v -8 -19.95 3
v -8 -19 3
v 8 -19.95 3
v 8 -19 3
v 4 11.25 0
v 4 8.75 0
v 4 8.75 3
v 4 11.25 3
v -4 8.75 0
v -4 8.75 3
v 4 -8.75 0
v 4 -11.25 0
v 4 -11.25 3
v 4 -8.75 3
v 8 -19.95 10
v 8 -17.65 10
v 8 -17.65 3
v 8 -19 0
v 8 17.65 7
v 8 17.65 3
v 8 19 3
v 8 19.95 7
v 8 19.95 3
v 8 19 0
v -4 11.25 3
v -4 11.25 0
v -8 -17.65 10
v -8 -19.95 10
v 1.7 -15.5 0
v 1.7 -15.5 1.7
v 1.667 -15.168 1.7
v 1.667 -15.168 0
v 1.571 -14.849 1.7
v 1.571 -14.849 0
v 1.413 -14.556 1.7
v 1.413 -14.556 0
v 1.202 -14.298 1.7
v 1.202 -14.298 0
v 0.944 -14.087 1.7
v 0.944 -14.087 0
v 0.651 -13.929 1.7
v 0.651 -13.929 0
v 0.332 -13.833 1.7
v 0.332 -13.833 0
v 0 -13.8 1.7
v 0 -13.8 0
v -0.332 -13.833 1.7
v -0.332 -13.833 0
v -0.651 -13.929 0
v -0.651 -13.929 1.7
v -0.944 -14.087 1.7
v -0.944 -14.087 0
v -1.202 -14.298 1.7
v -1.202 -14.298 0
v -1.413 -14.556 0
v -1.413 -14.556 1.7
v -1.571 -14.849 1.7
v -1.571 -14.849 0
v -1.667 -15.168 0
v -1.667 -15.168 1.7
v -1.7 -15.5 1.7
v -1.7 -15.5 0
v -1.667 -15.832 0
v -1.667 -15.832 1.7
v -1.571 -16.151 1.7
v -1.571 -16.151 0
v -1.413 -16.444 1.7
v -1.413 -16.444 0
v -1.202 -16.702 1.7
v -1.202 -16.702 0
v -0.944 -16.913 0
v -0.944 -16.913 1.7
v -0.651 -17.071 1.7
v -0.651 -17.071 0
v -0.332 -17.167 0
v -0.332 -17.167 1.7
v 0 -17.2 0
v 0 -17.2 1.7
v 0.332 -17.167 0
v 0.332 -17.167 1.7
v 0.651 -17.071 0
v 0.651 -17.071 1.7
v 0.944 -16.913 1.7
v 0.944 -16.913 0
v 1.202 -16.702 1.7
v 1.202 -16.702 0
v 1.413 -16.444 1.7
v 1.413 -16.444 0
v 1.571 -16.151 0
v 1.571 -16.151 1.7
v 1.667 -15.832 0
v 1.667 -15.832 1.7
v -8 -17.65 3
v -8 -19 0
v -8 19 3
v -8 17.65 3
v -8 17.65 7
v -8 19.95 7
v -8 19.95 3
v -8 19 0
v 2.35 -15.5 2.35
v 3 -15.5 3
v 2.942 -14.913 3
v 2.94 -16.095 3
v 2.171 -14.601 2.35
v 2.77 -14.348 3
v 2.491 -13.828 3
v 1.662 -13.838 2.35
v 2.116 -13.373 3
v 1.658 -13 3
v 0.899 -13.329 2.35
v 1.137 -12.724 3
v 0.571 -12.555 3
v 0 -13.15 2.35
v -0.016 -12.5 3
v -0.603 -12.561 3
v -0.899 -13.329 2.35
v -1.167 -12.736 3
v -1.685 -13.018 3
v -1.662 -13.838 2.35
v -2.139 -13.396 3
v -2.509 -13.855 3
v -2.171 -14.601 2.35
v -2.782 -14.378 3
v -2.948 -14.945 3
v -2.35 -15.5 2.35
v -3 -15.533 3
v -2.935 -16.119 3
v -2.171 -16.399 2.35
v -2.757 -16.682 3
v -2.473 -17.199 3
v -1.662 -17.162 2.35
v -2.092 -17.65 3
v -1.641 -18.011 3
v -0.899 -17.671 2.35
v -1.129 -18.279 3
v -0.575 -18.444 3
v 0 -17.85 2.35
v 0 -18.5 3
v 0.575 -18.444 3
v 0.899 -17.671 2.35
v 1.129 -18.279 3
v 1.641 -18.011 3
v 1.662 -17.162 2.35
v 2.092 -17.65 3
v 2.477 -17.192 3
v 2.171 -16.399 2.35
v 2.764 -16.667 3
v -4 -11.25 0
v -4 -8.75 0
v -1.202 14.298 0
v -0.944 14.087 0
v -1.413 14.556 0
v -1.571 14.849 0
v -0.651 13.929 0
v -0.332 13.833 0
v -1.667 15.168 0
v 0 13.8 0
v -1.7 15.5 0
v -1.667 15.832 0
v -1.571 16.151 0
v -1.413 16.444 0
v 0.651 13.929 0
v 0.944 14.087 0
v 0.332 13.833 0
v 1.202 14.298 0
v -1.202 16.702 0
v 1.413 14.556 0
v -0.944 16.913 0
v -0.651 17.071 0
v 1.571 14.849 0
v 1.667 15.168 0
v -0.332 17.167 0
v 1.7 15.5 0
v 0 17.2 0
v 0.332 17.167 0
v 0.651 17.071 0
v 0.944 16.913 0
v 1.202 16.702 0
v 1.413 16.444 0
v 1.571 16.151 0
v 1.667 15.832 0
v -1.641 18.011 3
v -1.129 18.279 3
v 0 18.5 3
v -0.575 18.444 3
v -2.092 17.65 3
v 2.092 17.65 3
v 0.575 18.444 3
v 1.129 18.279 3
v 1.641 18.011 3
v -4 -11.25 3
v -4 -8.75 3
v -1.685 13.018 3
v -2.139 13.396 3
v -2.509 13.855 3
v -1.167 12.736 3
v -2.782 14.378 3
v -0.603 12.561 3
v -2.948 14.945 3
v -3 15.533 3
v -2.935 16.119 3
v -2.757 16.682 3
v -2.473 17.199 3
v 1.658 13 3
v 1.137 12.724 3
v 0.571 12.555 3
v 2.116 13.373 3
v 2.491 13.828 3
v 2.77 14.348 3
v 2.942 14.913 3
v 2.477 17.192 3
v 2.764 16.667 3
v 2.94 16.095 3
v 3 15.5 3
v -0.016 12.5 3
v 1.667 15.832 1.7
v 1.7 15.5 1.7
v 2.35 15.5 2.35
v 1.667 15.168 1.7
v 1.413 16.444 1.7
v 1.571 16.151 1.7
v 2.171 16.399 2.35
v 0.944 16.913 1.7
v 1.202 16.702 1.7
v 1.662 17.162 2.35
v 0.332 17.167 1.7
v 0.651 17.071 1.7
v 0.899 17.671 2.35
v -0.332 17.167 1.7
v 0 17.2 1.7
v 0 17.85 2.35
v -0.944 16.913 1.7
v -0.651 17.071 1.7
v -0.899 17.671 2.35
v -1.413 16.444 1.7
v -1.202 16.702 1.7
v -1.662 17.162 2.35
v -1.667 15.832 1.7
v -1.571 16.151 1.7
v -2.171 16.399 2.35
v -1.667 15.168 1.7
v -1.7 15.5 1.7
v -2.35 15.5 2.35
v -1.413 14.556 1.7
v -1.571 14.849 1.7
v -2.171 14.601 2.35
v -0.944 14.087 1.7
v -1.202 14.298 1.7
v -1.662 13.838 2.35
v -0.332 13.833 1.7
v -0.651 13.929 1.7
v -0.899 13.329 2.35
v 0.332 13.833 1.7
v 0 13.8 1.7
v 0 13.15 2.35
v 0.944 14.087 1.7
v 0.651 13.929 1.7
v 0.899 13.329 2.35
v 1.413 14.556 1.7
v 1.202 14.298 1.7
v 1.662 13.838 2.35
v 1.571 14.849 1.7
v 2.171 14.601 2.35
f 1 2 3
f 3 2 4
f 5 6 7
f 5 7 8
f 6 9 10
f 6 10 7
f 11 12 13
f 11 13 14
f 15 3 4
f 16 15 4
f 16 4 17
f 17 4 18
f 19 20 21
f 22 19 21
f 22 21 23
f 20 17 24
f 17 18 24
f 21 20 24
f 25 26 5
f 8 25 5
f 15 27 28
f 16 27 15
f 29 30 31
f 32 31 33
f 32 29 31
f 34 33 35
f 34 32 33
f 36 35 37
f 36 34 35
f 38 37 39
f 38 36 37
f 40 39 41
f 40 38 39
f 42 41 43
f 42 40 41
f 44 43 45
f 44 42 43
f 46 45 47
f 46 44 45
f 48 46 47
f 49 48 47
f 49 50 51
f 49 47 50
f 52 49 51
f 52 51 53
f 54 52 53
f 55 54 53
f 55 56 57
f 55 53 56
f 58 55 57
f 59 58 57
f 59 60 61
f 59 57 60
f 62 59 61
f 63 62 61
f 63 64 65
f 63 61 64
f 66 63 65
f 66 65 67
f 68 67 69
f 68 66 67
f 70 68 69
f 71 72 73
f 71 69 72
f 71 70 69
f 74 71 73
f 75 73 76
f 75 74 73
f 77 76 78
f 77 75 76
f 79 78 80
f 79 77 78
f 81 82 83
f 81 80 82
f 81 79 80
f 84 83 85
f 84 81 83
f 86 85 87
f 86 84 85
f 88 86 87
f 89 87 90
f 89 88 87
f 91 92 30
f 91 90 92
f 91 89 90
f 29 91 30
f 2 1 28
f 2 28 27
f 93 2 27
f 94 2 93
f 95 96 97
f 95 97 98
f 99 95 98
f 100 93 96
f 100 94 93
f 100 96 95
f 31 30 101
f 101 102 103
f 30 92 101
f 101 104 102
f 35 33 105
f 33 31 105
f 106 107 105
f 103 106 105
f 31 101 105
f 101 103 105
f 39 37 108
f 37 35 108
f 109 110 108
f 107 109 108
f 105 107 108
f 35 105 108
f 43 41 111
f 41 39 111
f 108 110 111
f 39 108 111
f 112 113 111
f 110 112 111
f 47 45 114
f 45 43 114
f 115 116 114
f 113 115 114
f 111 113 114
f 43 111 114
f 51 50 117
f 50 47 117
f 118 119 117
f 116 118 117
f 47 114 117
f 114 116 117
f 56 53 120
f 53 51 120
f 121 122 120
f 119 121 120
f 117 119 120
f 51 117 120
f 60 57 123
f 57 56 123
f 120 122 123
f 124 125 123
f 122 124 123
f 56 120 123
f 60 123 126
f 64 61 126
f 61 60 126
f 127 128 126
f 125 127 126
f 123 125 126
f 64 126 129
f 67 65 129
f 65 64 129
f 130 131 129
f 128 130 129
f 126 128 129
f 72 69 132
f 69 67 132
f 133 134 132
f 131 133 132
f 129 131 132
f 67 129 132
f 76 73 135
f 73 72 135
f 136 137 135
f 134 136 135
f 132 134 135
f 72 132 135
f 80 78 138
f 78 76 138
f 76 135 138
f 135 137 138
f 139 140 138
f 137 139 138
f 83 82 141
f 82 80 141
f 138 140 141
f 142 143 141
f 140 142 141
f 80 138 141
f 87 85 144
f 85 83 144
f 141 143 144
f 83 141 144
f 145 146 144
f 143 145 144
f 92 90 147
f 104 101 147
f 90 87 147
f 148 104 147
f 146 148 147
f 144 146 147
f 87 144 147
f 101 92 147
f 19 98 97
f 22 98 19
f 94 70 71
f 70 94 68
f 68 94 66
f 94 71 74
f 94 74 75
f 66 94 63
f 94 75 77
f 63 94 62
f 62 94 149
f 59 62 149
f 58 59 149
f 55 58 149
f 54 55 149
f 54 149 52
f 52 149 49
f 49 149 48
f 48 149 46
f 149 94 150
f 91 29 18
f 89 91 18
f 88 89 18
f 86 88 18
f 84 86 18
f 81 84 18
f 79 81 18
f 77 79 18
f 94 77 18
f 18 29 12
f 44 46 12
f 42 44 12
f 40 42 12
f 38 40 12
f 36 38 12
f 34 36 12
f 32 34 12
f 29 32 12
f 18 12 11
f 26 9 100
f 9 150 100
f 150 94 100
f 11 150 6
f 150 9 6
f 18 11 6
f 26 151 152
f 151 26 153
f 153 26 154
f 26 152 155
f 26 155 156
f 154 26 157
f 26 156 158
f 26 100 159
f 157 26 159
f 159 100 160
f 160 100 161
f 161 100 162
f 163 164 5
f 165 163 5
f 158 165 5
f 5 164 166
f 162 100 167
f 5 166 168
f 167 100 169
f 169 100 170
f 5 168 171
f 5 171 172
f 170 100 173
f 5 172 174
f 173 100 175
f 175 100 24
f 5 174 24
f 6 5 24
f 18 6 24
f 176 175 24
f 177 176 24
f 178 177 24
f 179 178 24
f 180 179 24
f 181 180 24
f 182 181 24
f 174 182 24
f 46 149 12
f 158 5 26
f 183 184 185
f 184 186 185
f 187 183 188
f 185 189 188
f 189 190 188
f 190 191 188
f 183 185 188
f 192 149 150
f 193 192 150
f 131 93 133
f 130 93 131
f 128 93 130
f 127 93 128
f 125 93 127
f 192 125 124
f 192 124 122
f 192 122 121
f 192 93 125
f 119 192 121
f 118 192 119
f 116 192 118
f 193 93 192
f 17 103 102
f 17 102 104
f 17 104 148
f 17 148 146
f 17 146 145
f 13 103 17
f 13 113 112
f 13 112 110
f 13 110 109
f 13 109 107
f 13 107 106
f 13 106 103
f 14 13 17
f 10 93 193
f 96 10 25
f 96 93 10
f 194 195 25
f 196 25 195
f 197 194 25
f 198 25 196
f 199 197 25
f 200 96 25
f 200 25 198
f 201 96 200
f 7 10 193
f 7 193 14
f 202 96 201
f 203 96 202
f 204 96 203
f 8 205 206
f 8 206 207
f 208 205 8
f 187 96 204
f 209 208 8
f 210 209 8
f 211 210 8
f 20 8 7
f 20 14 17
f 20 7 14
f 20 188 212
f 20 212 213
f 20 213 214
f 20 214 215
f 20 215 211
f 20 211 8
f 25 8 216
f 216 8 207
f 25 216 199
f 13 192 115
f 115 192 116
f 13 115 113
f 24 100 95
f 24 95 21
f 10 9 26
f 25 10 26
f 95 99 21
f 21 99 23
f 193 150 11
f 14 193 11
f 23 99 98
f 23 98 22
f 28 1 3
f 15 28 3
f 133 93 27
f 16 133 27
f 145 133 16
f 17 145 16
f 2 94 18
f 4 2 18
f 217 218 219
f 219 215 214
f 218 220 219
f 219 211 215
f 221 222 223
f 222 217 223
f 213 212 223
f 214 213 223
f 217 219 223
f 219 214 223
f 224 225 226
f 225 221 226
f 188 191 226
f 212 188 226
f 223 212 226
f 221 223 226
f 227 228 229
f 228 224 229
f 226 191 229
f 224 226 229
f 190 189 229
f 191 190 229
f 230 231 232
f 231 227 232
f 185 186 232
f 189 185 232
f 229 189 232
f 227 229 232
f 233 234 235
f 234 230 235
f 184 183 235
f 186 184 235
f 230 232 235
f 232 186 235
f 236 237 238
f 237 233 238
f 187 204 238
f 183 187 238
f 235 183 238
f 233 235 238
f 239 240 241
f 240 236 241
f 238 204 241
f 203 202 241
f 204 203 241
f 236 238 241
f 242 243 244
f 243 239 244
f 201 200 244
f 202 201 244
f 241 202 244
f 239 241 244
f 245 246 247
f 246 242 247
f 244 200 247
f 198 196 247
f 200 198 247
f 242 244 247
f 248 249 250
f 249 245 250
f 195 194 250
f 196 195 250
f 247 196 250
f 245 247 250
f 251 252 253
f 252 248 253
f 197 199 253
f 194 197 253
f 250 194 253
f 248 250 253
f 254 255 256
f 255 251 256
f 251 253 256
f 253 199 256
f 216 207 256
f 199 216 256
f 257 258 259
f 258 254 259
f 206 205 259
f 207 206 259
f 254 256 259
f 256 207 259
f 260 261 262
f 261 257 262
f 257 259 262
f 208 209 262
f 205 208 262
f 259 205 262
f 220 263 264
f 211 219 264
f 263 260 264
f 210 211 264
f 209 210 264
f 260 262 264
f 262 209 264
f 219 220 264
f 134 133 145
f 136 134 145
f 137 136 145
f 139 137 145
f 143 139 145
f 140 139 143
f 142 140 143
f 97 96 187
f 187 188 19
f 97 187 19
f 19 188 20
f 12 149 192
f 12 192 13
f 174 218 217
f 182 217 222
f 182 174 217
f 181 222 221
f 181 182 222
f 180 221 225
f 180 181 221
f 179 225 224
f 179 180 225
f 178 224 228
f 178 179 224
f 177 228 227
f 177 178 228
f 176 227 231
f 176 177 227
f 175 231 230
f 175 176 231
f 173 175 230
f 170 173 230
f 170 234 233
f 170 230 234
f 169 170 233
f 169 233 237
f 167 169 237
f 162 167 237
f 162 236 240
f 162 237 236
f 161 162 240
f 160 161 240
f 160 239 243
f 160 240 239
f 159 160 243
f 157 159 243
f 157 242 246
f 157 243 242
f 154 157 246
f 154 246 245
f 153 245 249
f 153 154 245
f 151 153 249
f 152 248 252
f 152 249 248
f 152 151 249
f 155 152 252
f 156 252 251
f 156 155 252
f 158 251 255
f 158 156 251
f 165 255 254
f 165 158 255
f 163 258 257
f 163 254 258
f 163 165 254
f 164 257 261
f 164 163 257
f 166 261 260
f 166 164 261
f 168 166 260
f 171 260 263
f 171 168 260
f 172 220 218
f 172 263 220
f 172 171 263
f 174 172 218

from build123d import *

# Parameters (mm, degrees)
SKETCH_CAMERA_SEAT_W     = 16
SKETCH_CAMERA_SEAT_H     = 38
CAMERA_SEAT_DEPTH        = 3
FRONT_LIP_START          = 3
SKETCH_FRONT_LIP_W       = 16
SKETCH_FRONT_LIP_H       = 2.3
FRONT_LIP_DEPTH          = 7
REAR_LIP_START           = 3
SKETCH_REAR_LIP_W        = 16
SKETCH_REAR_LIP_H        = 2.3
REAR_LIP_DEPTH           = 4
STRAP_SLOTS_START        = -1
SKETCH_STRAP_SLOTS_W     = 8
SKETCH_STRAP_SLOTS_H     = 2.5
STRAP_SLOTS_DEPTH        = 5
M3_THROUGH_START         = -1
SKETCH_M3_THROUGH_R      = 1.7
M3_THROUGH_DEPTH         = 5
FLAT_HEAD_90DEG_START    = 1.5
SKETCH_FLAT_HEAD_90DEG_R = 1.5
FLAT_HEAD_90DEG_DEPTH    = 1.5
FLAT_HEAD_90DEG_TAPER    = -45


with BuildPart() as part:
    # Sketch_Camera_seat → Camera_seat (new body)
    with BuildSketch(Plane.XY):
        Rectangle(SKETCH_CAMERA_SEAT_W, SKETCH_CAMERA_SEAT_H)
    extrude(amount=CAMERA_SEAT_DEPTH)

    # Sketch_Front_lip → Front_lip (add)
    with BuildSketch(Plane.XY.offset(FRONT_LIP_START)):
        with Locations((0, -18.8)):
            Rectangle(SKETCH_FRONT_LIP_W, SKETCH_FRONT_LIP_H)
    extrude(amount=FRONT_LIP_DEPTH)

    # Sketch_Rear_lip → Rear_lip (add)
    with BuildSketch(Plane.XY.offset(REAR_LIP_START)):
        with Locations((0, 18.8)):
            Rectangle(SKETCH_REAR_LIP_W, SKETCH_REAR_LIP_H)
    extrude(amount=REAR_LIP_DEPTH)

    # Sketch_Strap_slots → Strap_slots (cut)
    with BuildSketch(Plane.XY.offset(STRAP_SLOTS_START)):
        with Locations((0, -10)):
            Rectangle(SKETCH_STRAP_SLOTS_W, SKETCH_STRAP_SLOTS_H)
        with Locations((0, 10)):
            Rectangle(SKETCH_STRAP_SLOTS_W, SKETCH_STRAP_SLOTS_H)
    extrude(amount=STRAP_SLOTS_DEPTH, mode=Mode.SUBTRACT)

    # Sketch_M3_through → M3_through (cut)
    with BuildSketch(Plane.XY.offset(M3_THROUGH_START)):
        with Locations((0, -15.5)):
            Circle(SKETCH_M3_THROUGH_R)
        with Locations((0, 15.5)):
            Circle(SKETCH_M3_THROUGH_R)
    extrude(amount=M3_THROUGH_DEPTH, mode=Mode.SUBTRACT)

    # Sketch_Flat_head_90deg → Flat_head_90deg (cut)
    with BuildSketch(Plane.XY.offset(FLAT_HEAD_90DEG_START)):
        with Locations((0, -15.5)):
            Circle(SKETCH_FLAT_HEAD_90DEG_R)
        with Locations((0, 15.5)):
            Circle(SKETCH_FLAT_HEAD_90DEG_R)
    extrude(amount=FLAT_HEAD_90DEG_DEPTH, taper=FLAT_HEAD_90DEG_TAPER, mode=Mode.SUBTRACT)


solid = part.part
